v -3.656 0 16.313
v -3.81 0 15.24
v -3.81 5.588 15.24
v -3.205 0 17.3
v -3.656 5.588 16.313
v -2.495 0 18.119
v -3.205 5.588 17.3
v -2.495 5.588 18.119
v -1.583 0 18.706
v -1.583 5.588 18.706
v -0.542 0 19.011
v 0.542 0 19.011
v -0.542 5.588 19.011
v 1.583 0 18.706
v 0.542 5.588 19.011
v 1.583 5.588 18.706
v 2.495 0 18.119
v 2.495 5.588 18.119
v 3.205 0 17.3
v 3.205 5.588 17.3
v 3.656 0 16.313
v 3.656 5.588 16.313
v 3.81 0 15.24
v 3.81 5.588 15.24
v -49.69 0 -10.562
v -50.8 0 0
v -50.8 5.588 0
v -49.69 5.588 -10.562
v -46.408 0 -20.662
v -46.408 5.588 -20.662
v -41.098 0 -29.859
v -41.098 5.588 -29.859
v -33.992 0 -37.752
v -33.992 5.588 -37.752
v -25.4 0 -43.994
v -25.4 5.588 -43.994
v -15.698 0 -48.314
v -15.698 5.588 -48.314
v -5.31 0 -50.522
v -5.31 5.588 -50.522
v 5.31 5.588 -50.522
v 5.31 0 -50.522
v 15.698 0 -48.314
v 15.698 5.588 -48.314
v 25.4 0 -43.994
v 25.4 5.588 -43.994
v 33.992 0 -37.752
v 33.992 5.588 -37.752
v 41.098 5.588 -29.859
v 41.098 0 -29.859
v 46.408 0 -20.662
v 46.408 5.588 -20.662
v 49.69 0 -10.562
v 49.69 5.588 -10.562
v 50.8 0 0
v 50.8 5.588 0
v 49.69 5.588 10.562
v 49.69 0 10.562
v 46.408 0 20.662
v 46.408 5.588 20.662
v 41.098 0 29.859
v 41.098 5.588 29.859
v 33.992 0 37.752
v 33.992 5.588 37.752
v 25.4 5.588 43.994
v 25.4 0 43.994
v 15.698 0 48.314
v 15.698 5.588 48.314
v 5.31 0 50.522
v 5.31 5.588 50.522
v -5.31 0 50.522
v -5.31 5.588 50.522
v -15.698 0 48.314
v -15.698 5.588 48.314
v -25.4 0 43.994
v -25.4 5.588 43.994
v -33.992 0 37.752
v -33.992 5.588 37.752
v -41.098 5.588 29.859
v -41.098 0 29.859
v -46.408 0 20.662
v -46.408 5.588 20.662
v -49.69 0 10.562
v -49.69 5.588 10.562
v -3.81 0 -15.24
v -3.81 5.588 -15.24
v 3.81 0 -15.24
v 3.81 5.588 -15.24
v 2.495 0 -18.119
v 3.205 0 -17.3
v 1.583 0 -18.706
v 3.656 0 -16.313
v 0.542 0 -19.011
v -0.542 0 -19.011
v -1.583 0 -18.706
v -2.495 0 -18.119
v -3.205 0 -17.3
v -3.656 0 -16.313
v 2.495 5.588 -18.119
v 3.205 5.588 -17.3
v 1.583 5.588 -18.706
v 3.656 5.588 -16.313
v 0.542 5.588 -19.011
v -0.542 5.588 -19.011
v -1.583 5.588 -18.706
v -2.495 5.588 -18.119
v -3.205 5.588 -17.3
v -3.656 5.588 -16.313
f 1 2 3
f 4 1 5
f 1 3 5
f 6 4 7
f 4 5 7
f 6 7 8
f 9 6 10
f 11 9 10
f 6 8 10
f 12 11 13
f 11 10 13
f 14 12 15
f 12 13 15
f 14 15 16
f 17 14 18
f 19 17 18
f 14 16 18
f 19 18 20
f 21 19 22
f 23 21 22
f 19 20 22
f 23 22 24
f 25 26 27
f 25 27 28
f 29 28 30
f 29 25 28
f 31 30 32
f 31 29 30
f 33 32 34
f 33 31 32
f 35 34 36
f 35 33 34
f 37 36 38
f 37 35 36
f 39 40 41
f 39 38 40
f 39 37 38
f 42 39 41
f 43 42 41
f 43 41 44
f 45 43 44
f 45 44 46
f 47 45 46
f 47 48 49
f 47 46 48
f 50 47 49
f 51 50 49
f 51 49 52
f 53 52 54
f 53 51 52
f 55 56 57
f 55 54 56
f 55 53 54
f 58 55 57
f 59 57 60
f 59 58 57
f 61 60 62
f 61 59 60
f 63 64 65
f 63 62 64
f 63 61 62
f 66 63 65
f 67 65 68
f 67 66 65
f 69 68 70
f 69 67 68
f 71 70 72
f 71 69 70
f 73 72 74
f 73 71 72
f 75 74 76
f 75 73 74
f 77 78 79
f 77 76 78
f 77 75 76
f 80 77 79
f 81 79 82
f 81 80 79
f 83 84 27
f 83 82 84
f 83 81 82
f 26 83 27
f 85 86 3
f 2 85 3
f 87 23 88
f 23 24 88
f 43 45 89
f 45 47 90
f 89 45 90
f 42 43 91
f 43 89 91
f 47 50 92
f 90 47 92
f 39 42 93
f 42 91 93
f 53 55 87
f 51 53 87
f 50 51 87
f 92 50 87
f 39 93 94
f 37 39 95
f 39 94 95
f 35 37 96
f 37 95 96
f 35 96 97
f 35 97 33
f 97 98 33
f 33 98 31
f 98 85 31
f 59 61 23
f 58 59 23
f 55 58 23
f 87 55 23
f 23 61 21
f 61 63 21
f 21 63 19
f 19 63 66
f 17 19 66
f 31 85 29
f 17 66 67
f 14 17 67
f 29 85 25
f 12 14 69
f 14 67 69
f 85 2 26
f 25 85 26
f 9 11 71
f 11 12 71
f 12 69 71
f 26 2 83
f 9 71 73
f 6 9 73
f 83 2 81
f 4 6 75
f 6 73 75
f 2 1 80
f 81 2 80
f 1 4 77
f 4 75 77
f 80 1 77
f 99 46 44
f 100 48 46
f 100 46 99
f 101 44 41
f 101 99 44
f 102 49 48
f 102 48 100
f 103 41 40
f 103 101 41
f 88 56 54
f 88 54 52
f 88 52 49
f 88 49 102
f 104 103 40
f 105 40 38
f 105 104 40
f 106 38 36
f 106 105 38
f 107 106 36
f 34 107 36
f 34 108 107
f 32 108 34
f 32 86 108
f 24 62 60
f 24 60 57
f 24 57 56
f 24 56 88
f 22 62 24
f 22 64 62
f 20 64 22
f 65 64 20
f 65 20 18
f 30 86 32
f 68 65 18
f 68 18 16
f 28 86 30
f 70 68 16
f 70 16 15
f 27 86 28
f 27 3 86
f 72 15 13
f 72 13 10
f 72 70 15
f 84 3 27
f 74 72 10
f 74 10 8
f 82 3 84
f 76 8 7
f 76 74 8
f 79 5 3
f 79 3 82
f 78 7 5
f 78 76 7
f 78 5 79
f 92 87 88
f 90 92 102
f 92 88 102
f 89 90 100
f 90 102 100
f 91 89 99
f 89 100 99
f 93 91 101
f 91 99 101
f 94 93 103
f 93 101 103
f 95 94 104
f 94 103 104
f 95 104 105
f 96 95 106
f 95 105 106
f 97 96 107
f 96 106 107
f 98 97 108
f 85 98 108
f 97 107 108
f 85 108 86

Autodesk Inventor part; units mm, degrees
ref_plane "YZ Plane" through (0, 0, 0) normal (1, 0, 0) x (0, 1, 0)
ref_plane "XZ Plane" through (0, 0, 0) normal (0, 1, 0) x (-1, 0, 0)
ref_plane "XY Plane" through (0, 0, 0) normal (0, 0, 1) x (1, 0, 0)
sketch "Sketch1" plane through (0, 0, 0) normal (0, 1, 0) x (-1, 0, 0)
  circle A0 centre (0, 0) radius 50.8
  dimension "d0" = 101.6
extrude "Extrusion1" add sketch "Sketch1" along normal blind 5.588
sketch "Sketch2" plane through (0, 5.588, 0) normal (0, 1, 0) x (1, 0, 0)
  line L0 (3.81, 13.97) -> (-3.81, 13.97)
  line L1 (-3.81, 13.97) -> (-3.81, -13.97)
  line L2 (-3.81, -13.97) -> (3.81, -13.97)
  line L3 (3.81, -13.97) -> (3.81, 13.97)
  point P0 (0, 0)
  dimension "d3" = 7.62
  dimension "d4" = 27.94
extrude "Extrusion2" cut sketch "Sketch2" against normal blind 5.588
sketch "Sketch3" plane through (0, 5.588, 0) normal (0, 1, 0) x (1, 0, 0)
  point P0 (0, 0)
sketch "Sketch4" plane through (0, 5.588, 0) normal (0, 1, 0) x (1, 0, 0)
  line L0 (3.81, 15.24) -> (-3.81, 15.24)
  line L1 (-3.81, 15.24) -> (-3.81, -15.24)
  line L2 (-3.81, -15.24) -> (3.81, -15.24)
  line L3 (3.81, -15.24) -> (3.81, 15.24)
  point P0 (0, 0)
  dimension "d7" = 30.48
extrude "Extrusion3" cut sketch "Sketch4" against normal blind 5.588
sketch "Sketch5" plane through (0, 5.588, 0) normal (0, 1, 0) x (1, 0, 0)
  line L0 (3.81, 15.24) -> (-3.81, 15.24) projected
  circle A0 centre (0, 15.24) radius 3.81
  point P0 (0, 0)
  dimension "d10" = 7.62
extrude "Extrusion4" cut sketch "Sketch5" against normal blind 5.588
sketch "Sketch6" plane through (0, 5.588, 0) normal (0, 1, 0) x (1, 0, 0)
  line L0 (-3.81, -15.24) -> (3.81, -15.24) projected
  circle A0 centre (0, -15.24) radius 3.81
  point P0 (0, 0)
  dimension "d13" = 7.62
extrude "Extrusion5" cut sketch "Sketch6" against normal blind 5.588
sketch "Sketch7" plane through (0, 5.588, 0) normal (0, 1, 0) x (1, 0, 0)
  point P0 (0, 0)
properties part number "midCup"
